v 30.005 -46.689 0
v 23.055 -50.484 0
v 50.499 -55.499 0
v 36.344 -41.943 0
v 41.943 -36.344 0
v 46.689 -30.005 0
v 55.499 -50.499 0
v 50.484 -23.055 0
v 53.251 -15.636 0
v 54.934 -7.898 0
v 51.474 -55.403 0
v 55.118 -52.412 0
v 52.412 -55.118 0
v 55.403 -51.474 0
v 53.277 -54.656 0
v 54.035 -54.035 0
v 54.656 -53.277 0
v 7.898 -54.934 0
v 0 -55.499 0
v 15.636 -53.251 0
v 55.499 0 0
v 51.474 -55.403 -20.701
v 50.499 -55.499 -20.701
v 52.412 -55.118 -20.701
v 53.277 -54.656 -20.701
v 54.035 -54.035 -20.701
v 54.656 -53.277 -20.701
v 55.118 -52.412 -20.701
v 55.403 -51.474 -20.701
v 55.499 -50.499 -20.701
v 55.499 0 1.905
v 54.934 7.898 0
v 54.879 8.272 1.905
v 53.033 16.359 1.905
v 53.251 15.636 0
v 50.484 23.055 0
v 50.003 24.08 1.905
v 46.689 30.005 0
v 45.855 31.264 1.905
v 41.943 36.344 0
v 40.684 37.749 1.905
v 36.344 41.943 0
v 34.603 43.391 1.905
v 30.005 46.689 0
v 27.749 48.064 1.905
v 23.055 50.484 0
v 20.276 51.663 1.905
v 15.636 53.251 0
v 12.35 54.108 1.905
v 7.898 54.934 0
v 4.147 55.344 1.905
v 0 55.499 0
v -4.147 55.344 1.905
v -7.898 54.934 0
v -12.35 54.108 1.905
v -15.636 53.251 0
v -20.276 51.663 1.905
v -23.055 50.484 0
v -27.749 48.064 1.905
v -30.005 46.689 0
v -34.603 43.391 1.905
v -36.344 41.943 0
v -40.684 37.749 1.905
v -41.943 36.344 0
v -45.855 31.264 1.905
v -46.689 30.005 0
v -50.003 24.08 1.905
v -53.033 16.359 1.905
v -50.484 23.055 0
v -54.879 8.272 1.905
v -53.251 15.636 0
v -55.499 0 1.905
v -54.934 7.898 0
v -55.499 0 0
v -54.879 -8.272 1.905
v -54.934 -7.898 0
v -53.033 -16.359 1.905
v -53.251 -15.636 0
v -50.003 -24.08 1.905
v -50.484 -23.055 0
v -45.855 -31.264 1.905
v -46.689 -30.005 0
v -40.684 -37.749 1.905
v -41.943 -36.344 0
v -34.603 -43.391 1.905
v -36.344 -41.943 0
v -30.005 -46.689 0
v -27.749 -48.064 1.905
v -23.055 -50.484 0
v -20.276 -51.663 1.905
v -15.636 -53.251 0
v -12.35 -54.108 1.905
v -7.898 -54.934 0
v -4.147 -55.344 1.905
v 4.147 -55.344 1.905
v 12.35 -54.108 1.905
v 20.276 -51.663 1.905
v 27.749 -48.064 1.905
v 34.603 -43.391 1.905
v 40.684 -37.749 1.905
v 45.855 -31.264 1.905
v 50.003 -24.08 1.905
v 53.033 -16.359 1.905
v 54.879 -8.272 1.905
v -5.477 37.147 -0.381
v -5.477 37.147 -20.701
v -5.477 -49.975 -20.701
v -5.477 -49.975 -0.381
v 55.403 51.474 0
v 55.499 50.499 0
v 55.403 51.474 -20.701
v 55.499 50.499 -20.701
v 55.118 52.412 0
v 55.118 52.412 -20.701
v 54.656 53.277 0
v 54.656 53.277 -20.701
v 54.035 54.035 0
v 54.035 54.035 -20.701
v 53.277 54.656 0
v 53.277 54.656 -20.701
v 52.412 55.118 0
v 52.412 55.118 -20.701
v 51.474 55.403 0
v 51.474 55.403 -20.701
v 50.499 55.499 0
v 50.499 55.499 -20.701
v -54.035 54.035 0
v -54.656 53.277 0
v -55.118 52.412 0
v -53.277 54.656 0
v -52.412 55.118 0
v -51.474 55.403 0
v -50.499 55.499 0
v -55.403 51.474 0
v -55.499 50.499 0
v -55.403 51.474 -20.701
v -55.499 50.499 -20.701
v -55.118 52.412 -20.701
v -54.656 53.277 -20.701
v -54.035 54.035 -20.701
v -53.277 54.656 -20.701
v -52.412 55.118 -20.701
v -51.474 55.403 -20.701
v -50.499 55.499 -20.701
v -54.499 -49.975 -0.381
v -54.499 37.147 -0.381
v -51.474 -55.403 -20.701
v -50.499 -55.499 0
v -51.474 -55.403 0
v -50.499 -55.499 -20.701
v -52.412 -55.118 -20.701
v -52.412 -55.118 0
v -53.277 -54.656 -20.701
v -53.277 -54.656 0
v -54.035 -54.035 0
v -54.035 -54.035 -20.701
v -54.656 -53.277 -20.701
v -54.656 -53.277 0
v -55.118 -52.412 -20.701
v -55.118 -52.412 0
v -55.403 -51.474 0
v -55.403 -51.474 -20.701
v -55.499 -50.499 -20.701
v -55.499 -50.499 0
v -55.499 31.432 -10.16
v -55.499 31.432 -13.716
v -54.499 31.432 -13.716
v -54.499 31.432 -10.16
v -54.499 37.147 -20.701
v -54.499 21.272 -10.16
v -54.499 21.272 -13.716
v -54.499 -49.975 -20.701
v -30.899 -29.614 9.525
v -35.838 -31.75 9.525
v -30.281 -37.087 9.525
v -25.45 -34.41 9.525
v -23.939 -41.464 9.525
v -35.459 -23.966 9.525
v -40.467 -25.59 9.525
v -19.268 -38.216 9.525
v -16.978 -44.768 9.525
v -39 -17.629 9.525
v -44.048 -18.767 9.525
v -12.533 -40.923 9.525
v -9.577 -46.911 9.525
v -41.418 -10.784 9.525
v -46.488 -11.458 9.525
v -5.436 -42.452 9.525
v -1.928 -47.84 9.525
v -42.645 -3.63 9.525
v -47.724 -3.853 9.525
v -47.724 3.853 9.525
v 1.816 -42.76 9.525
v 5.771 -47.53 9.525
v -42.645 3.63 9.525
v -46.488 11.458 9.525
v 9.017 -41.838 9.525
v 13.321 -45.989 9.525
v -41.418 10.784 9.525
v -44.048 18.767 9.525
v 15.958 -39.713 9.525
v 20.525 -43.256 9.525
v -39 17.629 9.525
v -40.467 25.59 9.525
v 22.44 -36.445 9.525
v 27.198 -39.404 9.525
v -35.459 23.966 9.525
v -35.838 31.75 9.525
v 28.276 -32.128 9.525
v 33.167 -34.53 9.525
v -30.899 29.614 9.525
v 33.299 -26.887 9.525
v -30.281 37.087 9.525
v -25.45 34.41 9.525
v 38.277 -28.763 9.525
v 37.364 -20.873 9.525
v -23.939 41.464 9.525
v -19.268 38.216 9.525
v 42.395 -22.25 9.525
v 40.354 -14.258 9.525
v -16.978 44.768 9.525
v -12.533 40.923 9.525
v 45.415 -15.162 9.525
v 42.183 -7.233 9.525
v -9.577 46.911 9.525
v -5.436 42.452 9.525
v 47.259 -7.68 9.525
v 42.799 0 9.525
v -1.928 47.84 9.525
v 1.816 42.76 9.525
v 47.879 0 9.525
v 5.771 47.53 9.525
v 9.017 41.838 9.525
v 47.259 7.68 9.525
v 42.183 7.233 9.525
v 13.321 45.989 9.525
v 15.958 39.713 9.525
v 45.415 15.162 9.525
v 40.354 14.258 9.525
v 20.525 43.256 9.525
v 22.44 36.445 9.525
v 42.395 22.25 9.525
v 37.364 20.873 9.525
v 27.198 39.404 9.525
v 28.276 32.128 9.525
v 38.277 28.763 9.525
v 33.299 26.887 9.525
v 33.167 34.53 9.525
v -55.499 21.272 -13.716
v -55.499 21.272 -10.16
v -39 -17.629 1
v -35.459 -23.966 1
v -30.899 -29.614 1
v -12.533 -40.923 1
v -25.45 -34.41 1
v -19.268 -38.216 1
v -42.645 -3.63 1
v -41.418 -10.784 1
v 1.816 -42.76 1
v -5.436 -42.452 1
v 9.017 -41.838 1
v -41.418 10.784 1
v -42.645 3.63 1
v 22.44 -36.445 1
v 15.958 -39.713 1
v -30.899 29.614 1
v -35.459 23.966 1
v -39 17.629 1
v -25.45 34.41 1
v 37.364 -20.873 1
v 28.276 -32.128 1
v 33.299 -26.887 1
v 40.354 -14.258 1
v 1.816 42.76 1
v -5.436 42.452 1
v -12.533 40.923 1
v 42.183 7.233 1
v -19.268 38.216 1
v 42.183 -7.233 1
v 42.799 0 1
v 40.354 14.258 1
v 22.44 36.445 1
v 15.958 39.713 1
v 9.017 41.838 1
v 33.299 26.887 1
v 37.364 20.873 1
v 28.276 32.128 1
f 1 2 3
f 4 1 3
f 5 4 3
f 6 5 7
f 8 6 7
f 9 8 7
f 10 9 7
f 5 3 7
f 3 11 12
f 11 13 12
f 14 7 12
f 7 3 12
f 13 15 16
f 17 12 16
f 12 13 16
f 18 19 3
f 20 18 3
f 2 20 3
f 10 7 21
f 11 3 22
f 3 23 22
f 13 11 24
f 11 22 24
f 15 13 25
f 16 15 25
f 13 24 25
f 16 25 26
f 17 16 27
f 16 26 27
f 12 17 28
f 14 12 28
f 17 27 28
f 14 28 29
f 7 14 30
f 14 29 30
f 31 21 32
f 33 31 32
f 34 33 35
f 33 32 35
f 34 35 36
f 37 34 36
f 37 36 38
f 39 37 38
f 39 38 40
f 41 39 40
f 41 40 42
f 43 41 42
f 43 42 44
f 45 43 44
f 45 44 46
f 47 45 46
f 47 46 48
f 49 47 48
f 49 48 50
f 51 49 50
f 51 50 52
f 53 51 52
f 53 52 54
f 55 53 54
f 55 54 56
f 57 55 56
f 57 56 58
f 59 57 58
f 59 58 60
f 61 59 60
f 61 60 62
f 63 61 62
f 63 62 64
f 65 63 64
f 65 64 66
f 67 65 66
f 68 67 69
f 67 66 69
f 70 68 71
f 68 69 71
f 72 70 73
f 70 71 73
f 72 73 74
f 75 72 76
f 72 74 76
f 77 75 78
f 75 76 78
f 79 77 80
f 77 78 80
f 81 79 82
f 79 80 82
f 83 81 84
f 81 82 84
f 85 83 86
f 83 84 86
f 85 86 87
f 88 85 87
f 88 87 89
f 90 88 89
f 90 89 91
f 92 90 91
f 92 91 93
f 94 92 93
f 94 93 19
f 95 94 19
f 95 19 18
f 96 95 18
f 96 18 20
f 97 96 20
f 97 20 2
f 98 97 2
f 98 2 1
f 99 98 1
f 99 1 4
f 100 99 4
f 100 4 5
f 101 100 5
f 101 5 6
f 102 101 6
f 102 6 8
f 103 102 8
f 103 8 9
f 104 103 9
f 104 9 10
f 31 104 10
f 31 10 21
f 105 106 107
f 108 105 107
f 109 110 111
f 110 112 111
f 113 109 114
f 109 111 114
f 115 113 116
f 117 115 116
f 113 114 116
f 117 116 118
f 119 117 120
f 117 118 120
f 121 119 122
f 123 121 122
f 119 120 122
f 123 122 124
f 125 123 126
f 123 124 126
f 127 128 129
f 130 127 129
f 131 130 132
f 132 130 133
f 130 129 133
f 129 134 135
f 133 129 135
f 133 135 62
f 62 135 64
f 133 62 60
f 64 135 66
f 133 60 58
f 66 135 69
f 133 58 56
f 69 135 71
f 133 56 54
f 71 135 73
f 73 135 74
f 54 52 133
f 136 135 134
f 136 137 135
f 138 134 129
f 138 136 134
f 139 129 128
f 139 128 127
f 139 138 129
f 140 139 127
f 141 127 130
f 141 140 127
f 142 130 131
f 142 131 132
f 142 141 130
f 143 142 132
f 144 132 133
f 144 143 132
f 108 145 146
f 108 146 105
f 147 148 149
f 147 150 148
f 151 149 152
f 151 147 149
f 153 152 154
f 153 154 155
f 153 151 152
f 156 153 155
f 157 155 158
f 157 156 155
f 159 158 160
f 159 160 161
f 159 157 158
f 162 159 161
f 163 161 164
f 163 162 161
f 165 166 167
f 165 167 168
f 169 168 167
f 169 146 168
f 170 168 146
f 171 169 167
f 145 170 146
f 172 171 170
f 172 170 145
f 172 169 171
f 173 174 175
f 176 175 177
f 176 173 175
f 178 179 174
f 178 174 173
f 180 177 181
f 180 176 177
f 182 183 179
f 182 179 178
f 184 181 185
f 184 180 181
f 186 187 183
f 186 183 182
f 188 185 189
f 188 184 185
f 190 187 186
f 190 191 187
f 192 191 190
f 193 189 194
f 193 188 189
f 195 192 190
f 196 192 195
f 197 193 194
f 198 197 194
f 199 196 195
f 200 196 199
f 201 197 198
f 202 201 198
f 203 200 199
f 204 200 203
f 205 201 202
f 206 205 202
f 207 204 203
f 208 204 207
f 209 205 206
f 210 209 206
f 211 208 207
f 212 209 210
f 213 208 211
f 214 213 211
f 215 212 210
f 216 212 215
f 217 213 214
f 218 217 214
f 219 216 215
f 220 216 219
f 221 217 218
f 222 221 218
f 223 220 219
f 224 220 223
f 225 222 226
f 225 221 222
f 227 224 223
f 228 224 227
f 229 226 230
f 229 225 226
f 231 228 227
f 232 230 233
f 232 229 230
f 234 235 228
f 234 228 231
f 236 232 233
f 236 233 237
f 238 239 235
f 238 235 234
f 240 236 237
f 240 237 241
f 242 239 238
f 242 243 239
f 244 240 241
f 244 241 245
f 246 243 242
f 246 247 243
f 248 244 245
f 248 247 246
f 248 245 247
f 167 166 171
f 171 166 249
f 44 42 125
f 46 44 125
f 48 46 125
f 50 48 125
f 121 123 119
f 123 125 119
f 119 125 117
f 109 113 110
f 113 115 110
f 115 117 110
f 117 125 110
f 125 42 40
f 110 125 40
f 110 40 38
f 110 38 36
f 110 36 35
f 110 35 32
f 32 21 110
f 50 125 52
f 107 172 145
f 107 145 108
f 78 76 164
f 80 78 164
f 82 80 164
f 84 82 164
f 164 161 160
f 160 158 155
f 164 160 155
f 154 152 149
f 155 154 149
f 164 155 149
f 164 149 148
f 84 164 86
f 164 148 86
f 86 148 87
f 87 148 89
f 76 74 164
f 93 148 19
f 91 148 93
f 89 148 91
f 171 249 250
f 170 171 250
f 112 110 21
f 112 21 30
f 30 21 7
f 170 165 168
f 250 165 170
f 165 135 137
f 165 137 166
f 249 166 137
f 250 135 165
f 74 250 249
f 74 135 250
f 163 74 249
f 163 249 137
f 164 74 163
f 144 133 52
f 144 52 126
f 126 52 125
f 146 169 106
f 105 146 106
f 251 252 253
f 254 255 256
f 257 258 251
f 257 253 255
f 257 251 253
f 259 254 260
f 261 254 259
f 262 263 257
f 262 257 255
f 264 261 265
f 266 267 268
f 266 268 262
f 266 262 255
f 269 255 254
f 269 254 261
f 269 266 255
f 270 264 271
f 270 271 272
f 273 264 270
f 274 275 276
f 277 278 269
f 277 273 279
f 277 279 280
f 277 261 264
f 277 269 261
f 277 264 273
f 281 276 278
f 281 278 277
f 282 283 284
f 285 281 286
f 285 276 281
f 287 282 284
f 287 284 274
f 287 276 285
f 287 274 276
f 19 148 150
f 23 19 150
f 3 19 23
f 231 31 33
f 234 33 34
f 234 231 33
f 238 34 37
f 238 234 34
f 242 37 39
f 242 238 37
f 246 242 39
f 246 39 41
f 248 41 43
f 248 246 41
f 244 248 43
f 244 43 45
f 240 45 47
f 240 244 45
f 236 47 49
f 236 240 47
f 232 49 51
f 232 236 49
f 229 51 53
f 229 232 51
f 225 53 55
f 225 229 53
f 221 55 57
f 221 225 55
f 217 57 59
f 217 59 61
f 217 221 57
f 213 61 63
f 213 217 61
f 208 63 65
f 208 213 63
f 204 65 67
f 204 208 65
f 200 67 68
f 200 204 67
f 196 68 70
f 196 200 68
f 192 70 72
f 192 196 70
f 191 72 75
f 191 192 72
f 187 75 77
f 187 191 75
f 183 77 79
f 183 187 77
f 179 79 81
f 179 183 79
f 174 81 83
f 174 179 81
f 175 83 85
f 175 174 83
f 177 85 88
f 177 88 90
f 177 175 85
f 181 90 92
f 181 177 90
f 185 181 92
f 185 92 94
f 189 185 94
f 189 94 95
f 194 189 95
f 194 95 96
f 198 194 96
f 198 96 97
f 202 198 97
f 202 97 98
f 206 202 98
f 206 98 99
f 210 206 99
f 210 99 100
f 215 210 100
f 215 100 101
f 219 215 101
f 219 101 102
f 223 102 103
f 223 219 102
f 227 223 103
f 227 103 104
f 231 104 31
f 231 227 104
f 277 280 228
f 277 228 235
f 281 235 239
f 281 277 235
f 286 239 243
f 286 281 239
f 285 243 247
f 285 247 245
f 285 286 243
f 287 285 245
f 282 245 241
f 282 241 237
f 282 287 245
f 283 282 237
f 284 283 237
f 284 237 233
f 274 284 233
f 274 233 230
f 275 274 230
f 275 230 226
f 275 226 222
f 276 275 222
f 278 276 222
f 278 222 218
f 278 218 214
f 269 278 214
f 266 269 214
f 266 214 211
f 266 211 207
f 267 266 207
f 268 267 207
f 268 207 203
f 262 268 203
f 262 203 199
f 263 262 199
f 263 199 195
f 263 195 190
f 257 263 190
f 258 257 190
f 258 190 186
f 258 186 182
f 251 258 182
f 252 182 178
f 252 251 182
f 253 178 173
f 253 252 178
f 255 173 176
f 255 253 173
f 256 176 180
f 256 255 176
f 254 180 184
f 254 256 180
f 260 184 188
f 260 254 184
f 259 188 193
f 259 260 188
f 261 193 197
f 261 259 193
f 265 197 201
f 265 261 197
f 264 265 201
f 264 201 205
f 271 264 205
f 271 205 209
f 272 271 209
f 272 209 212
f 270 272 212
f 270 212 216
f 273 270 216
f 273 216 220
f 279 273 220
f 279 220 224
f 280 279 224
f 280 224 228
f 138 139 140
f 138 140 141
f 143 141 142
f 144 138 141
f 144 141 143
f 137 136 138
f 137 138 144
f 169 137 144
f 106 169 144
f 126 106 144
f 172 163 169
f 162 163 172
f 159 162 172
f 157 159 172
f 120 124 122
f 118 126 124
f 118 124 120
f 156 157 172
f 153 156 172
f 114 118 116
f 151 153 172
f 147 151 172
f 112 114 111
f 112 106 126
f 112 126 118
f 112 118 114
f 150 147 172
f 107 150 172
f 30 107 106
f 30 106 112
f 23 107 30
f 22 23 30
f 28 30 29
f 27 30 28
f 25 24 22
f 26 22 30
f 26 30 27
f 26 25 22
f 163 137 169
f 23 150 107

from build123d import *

# Parameters (mm, degrees)
F0_R      = 55.499
F0_R_2    = 42.799
F1_DEPTH  = 9.525
F2_W      = 110.998
F2_H      = 110.998
F3_DEPTH  = 20.701
F4_SIZE   = 7.62
F5_W      = 49.022
F5_H      = 87.122
F6_DEPTH  = 20.32
F7_W      = 10.16
F7_H      = 3.556
F8_DEPTH  = 1
F9_R      = 5
F10_R     = 42.799
F11_DEPTH = 1


with BuildPart() as f1:
    # F0 (on Top) → F1 (new body)
    with BuildSketch(Plane.XY):
        Circle(F0_R)
        Circle(F0_R_2, mode=Mode.SUBTRACT)
    extrude(amount=F1_DEPTH)

    # F2 (on face) → F3 (join)
    with BuildSketch(Plane(origin=(0, 0, 0), x_dir=(1, 0, 0), z_dir=(0, 0, -1))):
        Rectangle(F2_W, F2_H)
    extrude(amount=F3_DEPTH)

    # F4
    f4_edges = [f1.edges().sort_by_distance(p)[0] for p in [
        (-55.499, 0, 9.525),
    ]]
    chamfer(f4_edges, length=F4_SIZE)

    # F5 (on face) → F6 (cut)
    with BuildSketch(Plane(origin=(0, 0, -20.701), x_dir=(1, 0, 0), z_dir=(0, 0, -1))):
        with Locations((-29.988, 6.413653)):
            Rectangle(F5_W, F5_H)
    extrude(amount=-F6_DEPTH, mode=Mode.SUBTRACT)

    # F7 (on face) → F8 (cut, through all)
    with BuildSketch(Plane(origin=(-55.499, 0, 0), x_dir=(0, -1, 0), z_dir=(-1, 0, 0))):
        with Locations((-26.352347, -11.938)):
            Rectangle(F7_W, F7_H)
    extrude(amount=-F8_DEPTH, mode=Mode.SUBTRACT)

    # F9
    f9_edges = [f1.edges().sort_by_distance(p)[0] for p in [
        (-55.499, -55.499, -10.3505),
        (-55.499, 55.499, -10.3505),
        (55.499, -55.499, -10.3505),
        (55.499, 55.499, -10.3505),
    ]]
    fillet(f9_edges, radius=F9_R)

    # F10 (on face) → F11 (join)
    with BuildSketch(Plane.XY):
        Circle(F10_R)
    extrude(amount=F11_DEPTH)


solid = f1.part
